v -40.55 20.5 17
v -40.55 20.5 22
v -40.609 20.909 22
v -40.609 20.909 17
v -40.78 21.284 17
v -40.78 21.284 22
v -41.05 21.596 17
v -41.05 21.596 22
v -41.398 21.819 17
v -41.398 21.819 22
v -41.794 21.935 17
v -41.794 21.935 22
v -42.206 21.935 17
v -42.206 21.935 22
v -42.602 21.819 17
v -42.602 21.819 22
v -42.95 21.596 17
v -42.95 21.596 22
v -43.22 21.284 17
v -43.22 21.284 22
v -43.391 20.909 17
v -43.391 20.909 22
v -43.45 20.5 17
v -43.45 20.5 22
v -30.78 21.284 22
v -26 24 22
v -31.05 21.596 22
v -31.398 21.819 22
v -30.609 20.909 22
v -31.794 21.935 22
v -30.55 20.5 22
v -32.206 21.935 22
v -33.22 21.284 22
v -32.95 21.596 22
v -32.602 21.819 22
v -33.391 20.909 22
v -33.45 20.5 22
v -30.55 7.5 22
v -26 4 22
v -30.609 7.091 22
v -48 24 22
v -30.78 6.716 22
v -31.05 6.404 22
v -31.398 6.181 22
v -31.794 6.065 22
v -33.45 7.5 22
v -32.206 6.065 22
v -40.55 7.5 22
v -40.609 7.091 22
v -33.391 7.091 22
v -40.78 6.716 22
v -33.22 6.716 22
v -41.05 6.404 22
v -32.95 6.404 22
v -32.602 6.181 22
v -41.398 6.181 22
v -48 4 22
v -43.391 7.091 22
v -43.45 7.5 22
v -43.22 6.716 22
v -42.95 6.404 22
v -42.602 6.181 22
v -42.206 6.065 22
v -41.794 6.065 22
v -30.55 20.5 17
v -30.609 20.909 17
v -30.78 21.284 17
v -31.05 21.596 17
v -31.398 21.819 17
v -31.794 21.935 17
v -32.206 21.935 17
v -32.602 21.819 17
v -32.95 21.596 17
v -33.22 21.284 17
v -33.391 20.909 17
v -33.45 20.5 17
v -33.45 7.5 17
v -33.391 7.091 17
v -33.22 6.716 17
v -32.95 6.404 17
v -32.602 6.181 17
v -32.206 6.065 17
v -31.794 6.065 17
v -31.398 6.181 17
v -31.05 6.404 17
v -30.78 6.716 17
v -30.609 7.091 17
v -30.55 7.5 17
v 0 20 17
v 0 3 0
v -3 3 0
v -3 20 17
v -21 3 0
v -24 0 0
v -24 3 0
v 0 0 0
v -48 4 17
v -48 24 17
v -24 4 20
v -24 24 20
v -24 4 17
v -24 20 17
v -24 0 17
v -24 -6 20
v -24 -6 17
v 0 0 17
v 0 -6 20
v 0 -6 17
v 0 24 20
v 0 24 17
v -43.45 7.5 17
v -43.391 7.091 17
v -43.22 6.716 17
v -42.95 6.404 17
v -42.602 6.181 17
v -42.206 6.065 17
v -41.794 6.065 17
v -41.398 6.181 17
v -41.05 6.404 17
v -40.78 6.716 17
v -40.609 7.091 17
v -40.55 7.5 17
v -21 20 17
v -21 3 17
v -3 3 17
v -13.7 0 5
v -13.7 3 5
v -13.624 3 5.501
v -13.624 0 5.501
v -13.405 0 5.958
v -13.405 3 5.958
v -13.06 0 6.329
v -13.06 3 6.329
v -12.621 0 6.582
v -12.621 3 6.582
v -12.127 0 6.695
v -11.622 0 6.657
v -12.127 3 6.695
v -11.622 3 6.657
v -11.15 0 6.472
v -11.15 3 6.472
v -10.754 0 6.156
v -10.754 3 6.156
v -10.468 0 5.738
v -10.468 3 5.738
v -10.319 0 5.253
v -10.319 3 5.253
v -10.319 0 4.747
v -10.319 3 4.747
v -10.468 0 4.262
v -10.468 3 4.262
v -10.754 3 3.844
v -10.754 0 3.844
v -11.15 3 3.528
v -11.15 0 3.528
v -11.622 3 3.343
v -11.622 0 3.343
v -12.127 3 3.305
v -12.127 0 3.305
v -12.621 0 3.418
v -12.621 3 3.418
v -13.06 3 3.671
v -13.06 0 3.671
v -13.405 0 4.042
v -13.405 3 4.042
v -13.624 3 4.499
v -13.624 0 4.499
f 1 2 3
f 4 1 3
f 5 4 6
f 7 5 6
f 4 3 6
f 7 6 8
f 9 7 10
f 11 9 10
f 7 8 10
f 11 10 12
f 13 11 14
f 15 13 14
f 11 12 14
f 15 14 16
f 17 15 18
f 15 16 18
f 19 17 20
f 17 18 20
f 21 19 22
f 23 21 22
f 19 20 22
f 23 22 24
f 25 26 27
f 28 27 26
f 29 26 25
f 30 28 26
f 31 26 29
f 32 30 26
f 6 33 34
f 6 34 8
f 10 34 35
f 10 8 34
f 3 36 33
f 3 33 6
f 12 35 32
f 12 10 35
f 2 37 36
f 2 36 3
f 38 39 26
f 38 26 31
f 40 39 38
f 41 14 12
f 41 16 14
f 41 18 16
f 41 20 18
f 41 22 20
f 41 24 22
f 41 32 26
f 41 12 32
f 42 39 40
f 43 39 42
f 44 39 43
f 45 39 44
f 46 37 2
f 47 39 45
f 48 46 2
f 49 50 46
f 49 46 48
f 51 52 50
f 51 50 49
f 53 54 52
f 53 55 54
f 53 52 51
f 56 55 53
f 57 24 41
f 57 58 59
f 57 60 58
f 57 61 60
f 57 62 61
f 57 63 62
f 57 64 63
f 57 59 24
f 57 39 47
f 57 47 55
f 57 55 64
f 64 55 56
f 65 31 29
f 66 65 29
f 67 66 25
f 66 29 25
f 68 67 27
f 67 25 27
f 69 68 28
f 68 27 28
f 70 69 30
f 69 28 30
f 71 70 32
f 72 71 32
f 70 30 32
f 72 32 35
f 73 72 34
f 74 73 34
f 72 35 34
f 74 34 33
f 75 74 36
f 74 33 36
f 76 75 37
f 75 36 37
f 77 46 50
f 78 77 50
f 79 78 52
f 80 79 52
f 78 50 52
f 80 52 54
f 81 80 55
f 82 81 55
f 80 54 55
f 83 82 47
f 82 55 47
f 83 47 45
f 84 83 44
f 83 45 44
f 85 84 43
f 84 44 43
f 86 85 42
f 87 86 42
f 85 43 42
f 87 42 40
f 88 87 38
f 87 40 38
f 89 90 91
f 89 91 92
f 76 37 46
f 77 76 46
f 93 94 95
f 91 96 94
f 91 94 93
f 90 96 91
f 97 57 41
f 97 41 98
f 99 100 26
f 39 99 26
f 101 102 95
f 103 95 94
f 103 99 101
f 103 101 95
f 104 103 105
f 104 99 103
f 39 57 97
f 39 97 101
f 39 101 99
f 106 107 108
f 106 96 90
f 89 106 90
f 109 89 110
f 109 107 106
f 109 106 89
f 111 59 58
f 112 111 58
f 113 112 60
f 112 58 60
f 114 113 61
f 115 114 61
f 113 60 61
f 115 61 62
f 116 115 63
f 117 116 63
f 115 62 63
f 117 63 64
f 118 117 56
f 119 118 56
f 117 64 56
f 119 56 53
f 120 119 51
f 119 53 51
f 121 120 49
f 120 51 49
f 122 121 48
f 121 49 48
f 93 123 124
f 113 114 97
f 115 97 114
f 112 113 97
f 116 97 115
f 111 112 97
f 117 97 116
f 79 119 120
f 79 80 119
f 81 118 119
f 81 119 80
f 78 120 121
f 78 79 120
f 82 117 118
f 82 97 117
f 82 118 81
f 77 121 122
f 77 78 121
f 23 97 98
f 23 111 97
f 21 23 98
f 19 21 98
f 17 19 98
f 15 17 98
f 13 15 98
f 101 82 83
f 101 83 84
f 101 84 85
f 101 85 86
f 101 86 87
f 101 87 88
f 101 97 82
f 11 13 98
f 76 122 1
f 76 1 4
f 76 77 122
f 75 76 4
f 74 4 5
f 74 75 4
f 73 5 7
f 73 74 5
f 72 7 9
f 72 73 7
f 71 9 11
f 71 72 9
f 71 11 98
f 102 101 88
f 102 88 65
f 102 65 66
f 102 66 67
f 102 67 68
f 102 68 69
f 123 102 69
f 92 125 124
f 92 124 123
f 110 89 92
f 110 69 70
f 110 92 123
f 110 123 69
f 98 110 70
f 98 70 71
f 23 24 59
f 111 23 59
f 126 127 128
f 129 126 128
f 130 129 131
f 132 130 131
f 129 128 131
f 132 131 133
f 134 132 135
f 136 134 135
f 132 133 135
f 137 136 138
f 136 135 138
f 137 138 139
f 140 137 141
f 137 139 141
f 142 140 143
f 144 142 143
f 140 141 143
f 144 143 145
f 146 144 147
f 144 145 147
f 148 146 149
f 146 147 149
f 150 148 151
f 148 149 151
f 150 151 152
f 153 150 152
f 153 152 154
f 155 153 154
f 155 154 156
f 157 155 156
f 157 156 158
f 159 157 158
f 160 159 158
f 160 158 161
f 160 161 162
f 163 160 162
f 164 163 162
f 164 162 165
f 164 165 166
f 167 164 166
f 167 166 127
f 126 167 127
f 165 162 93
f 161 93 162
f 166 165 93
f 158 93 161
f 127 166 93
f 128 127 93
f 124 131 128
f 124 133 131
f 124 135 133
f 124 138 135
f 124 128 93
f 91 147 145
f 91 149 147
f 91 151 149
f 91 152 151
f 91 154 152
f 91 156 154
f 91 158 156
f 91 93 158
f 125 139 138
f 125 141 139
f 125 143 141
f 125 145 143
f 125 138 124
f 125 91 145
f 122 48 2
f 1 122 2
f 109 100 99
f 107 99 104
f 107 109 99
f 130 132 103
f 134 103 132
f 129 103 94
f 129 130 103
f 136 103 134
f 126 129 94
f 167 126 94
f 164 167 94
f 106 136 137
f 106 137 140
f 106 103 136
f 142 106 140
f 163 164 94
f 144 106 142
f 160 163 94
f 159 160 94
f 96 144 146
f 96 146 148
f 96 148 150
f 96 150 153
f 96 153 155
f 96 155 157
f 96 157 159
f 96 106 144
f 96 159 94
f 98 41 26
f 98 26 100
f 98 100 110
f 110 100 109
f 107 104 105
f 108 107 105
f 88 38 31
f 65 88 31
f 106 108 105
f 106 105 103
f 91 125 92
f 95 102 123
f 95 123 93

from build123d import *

# Parameters (mm, degrees)
F1_DEPTH  = 48
F2_DEPTH  = 3
F3_W      = 24
F3_H      = 10
F4_DEPTH  = 25
F6_DEPTH  = 3
F7_R      = 1.7
F8_DEPTH  = 9.001
F10_DEPTH = 20
F12_DEPTH = 22.001


with BuildPart() as f1:
    # F0 (on Right) → F1 (new body)
    with BuildSketch(Plane.YZ):
        Polygon((24, 20), (-6, 20), (-6, 17), (0, 17), (0, 0), (3, 0), (3, 17), (20, 17), (24, 17), align=None)
    extrude(amount=-F1_DEPTH)

    # F0 (on Right) → F2 (join)
    with BuildSketch(Plane.YZ):
        Polygon((3, 0), (20, 17), (3, 17), align=None)
    extrude(amount=-F2_DEPTH)

    # F3 (on face) → F4 (cut)
    with BuildSketch(Plane.XY.offset(20)):
        with Locations((-36, -1)):
            Rectangle(F3_W, F3_H)
    extrude(amount=-F4_DEPTH, mode=Mode.SUBTRACT)

    # F5 (on face) → F6 (join)
    with BuildSketch(Plane(origin=(-24, 0, 0), x_dir=(0, -1, 0), z_dir=(-1, 0, 0))):
        Polygon((-3, 0), (-3, 17), (-20, 17), align=None)
    extrude(amount=-F6_DEPTH)

    # F7 (on face) → F8 (cut, through all)
    with BuildSketch(Plane(origin=(0, 3, 0), x_dir=(-1, 0, 0), z_dir=(0, 1, 0))):
        with Locations((12, 5)):
            Circle(F7_R)
    extrude(amount=-F8_DEPTH, mode=Mode.SUBTRACT)

    # F9 (on face) → F10 (join)
    with BuildSketch(Plane.XZ.offset(-4)):
        Polygon((-48, 20), (-24, 20), (-26, 22), (-48, 22), align=None)
    extrude(amount=-F10_DEPTH)

    # F11 (on face) → F12 (cut, through all)
    with BuildSketch(Plane.XY.offset(22)):
        with BuildLine():
            Line((-40.55, 7.5), (-40.55, 20.5))
            ThreePointArc((-40.55, 20.5), (-42, 21.95), (-43.45, 20.5))
            Line((-43.45, 20.5), (-43.45, 7.5))
            ThreePointArc((-43.45, 7.5), (-42, 6.05), (-40.55, 7.5))
        make_face()
        with BuildLine():
            Line((-30.55, 7.5), (-30.55, 20.5))
            ThreePointArc((-30.55, 20.5), (-32, 21.95), (-33.45, 20.5))
            Line((-33.45, 20.5), (-33.45, 7.5))
            ThreePointArc((-33.45, 7.5), (-32, 6.05), (-30.55, 7.5))
        make_face()
    extrude(amount=-F12_DEPTH, mode=Mode.SUBTRACT)


solid = f1.part
